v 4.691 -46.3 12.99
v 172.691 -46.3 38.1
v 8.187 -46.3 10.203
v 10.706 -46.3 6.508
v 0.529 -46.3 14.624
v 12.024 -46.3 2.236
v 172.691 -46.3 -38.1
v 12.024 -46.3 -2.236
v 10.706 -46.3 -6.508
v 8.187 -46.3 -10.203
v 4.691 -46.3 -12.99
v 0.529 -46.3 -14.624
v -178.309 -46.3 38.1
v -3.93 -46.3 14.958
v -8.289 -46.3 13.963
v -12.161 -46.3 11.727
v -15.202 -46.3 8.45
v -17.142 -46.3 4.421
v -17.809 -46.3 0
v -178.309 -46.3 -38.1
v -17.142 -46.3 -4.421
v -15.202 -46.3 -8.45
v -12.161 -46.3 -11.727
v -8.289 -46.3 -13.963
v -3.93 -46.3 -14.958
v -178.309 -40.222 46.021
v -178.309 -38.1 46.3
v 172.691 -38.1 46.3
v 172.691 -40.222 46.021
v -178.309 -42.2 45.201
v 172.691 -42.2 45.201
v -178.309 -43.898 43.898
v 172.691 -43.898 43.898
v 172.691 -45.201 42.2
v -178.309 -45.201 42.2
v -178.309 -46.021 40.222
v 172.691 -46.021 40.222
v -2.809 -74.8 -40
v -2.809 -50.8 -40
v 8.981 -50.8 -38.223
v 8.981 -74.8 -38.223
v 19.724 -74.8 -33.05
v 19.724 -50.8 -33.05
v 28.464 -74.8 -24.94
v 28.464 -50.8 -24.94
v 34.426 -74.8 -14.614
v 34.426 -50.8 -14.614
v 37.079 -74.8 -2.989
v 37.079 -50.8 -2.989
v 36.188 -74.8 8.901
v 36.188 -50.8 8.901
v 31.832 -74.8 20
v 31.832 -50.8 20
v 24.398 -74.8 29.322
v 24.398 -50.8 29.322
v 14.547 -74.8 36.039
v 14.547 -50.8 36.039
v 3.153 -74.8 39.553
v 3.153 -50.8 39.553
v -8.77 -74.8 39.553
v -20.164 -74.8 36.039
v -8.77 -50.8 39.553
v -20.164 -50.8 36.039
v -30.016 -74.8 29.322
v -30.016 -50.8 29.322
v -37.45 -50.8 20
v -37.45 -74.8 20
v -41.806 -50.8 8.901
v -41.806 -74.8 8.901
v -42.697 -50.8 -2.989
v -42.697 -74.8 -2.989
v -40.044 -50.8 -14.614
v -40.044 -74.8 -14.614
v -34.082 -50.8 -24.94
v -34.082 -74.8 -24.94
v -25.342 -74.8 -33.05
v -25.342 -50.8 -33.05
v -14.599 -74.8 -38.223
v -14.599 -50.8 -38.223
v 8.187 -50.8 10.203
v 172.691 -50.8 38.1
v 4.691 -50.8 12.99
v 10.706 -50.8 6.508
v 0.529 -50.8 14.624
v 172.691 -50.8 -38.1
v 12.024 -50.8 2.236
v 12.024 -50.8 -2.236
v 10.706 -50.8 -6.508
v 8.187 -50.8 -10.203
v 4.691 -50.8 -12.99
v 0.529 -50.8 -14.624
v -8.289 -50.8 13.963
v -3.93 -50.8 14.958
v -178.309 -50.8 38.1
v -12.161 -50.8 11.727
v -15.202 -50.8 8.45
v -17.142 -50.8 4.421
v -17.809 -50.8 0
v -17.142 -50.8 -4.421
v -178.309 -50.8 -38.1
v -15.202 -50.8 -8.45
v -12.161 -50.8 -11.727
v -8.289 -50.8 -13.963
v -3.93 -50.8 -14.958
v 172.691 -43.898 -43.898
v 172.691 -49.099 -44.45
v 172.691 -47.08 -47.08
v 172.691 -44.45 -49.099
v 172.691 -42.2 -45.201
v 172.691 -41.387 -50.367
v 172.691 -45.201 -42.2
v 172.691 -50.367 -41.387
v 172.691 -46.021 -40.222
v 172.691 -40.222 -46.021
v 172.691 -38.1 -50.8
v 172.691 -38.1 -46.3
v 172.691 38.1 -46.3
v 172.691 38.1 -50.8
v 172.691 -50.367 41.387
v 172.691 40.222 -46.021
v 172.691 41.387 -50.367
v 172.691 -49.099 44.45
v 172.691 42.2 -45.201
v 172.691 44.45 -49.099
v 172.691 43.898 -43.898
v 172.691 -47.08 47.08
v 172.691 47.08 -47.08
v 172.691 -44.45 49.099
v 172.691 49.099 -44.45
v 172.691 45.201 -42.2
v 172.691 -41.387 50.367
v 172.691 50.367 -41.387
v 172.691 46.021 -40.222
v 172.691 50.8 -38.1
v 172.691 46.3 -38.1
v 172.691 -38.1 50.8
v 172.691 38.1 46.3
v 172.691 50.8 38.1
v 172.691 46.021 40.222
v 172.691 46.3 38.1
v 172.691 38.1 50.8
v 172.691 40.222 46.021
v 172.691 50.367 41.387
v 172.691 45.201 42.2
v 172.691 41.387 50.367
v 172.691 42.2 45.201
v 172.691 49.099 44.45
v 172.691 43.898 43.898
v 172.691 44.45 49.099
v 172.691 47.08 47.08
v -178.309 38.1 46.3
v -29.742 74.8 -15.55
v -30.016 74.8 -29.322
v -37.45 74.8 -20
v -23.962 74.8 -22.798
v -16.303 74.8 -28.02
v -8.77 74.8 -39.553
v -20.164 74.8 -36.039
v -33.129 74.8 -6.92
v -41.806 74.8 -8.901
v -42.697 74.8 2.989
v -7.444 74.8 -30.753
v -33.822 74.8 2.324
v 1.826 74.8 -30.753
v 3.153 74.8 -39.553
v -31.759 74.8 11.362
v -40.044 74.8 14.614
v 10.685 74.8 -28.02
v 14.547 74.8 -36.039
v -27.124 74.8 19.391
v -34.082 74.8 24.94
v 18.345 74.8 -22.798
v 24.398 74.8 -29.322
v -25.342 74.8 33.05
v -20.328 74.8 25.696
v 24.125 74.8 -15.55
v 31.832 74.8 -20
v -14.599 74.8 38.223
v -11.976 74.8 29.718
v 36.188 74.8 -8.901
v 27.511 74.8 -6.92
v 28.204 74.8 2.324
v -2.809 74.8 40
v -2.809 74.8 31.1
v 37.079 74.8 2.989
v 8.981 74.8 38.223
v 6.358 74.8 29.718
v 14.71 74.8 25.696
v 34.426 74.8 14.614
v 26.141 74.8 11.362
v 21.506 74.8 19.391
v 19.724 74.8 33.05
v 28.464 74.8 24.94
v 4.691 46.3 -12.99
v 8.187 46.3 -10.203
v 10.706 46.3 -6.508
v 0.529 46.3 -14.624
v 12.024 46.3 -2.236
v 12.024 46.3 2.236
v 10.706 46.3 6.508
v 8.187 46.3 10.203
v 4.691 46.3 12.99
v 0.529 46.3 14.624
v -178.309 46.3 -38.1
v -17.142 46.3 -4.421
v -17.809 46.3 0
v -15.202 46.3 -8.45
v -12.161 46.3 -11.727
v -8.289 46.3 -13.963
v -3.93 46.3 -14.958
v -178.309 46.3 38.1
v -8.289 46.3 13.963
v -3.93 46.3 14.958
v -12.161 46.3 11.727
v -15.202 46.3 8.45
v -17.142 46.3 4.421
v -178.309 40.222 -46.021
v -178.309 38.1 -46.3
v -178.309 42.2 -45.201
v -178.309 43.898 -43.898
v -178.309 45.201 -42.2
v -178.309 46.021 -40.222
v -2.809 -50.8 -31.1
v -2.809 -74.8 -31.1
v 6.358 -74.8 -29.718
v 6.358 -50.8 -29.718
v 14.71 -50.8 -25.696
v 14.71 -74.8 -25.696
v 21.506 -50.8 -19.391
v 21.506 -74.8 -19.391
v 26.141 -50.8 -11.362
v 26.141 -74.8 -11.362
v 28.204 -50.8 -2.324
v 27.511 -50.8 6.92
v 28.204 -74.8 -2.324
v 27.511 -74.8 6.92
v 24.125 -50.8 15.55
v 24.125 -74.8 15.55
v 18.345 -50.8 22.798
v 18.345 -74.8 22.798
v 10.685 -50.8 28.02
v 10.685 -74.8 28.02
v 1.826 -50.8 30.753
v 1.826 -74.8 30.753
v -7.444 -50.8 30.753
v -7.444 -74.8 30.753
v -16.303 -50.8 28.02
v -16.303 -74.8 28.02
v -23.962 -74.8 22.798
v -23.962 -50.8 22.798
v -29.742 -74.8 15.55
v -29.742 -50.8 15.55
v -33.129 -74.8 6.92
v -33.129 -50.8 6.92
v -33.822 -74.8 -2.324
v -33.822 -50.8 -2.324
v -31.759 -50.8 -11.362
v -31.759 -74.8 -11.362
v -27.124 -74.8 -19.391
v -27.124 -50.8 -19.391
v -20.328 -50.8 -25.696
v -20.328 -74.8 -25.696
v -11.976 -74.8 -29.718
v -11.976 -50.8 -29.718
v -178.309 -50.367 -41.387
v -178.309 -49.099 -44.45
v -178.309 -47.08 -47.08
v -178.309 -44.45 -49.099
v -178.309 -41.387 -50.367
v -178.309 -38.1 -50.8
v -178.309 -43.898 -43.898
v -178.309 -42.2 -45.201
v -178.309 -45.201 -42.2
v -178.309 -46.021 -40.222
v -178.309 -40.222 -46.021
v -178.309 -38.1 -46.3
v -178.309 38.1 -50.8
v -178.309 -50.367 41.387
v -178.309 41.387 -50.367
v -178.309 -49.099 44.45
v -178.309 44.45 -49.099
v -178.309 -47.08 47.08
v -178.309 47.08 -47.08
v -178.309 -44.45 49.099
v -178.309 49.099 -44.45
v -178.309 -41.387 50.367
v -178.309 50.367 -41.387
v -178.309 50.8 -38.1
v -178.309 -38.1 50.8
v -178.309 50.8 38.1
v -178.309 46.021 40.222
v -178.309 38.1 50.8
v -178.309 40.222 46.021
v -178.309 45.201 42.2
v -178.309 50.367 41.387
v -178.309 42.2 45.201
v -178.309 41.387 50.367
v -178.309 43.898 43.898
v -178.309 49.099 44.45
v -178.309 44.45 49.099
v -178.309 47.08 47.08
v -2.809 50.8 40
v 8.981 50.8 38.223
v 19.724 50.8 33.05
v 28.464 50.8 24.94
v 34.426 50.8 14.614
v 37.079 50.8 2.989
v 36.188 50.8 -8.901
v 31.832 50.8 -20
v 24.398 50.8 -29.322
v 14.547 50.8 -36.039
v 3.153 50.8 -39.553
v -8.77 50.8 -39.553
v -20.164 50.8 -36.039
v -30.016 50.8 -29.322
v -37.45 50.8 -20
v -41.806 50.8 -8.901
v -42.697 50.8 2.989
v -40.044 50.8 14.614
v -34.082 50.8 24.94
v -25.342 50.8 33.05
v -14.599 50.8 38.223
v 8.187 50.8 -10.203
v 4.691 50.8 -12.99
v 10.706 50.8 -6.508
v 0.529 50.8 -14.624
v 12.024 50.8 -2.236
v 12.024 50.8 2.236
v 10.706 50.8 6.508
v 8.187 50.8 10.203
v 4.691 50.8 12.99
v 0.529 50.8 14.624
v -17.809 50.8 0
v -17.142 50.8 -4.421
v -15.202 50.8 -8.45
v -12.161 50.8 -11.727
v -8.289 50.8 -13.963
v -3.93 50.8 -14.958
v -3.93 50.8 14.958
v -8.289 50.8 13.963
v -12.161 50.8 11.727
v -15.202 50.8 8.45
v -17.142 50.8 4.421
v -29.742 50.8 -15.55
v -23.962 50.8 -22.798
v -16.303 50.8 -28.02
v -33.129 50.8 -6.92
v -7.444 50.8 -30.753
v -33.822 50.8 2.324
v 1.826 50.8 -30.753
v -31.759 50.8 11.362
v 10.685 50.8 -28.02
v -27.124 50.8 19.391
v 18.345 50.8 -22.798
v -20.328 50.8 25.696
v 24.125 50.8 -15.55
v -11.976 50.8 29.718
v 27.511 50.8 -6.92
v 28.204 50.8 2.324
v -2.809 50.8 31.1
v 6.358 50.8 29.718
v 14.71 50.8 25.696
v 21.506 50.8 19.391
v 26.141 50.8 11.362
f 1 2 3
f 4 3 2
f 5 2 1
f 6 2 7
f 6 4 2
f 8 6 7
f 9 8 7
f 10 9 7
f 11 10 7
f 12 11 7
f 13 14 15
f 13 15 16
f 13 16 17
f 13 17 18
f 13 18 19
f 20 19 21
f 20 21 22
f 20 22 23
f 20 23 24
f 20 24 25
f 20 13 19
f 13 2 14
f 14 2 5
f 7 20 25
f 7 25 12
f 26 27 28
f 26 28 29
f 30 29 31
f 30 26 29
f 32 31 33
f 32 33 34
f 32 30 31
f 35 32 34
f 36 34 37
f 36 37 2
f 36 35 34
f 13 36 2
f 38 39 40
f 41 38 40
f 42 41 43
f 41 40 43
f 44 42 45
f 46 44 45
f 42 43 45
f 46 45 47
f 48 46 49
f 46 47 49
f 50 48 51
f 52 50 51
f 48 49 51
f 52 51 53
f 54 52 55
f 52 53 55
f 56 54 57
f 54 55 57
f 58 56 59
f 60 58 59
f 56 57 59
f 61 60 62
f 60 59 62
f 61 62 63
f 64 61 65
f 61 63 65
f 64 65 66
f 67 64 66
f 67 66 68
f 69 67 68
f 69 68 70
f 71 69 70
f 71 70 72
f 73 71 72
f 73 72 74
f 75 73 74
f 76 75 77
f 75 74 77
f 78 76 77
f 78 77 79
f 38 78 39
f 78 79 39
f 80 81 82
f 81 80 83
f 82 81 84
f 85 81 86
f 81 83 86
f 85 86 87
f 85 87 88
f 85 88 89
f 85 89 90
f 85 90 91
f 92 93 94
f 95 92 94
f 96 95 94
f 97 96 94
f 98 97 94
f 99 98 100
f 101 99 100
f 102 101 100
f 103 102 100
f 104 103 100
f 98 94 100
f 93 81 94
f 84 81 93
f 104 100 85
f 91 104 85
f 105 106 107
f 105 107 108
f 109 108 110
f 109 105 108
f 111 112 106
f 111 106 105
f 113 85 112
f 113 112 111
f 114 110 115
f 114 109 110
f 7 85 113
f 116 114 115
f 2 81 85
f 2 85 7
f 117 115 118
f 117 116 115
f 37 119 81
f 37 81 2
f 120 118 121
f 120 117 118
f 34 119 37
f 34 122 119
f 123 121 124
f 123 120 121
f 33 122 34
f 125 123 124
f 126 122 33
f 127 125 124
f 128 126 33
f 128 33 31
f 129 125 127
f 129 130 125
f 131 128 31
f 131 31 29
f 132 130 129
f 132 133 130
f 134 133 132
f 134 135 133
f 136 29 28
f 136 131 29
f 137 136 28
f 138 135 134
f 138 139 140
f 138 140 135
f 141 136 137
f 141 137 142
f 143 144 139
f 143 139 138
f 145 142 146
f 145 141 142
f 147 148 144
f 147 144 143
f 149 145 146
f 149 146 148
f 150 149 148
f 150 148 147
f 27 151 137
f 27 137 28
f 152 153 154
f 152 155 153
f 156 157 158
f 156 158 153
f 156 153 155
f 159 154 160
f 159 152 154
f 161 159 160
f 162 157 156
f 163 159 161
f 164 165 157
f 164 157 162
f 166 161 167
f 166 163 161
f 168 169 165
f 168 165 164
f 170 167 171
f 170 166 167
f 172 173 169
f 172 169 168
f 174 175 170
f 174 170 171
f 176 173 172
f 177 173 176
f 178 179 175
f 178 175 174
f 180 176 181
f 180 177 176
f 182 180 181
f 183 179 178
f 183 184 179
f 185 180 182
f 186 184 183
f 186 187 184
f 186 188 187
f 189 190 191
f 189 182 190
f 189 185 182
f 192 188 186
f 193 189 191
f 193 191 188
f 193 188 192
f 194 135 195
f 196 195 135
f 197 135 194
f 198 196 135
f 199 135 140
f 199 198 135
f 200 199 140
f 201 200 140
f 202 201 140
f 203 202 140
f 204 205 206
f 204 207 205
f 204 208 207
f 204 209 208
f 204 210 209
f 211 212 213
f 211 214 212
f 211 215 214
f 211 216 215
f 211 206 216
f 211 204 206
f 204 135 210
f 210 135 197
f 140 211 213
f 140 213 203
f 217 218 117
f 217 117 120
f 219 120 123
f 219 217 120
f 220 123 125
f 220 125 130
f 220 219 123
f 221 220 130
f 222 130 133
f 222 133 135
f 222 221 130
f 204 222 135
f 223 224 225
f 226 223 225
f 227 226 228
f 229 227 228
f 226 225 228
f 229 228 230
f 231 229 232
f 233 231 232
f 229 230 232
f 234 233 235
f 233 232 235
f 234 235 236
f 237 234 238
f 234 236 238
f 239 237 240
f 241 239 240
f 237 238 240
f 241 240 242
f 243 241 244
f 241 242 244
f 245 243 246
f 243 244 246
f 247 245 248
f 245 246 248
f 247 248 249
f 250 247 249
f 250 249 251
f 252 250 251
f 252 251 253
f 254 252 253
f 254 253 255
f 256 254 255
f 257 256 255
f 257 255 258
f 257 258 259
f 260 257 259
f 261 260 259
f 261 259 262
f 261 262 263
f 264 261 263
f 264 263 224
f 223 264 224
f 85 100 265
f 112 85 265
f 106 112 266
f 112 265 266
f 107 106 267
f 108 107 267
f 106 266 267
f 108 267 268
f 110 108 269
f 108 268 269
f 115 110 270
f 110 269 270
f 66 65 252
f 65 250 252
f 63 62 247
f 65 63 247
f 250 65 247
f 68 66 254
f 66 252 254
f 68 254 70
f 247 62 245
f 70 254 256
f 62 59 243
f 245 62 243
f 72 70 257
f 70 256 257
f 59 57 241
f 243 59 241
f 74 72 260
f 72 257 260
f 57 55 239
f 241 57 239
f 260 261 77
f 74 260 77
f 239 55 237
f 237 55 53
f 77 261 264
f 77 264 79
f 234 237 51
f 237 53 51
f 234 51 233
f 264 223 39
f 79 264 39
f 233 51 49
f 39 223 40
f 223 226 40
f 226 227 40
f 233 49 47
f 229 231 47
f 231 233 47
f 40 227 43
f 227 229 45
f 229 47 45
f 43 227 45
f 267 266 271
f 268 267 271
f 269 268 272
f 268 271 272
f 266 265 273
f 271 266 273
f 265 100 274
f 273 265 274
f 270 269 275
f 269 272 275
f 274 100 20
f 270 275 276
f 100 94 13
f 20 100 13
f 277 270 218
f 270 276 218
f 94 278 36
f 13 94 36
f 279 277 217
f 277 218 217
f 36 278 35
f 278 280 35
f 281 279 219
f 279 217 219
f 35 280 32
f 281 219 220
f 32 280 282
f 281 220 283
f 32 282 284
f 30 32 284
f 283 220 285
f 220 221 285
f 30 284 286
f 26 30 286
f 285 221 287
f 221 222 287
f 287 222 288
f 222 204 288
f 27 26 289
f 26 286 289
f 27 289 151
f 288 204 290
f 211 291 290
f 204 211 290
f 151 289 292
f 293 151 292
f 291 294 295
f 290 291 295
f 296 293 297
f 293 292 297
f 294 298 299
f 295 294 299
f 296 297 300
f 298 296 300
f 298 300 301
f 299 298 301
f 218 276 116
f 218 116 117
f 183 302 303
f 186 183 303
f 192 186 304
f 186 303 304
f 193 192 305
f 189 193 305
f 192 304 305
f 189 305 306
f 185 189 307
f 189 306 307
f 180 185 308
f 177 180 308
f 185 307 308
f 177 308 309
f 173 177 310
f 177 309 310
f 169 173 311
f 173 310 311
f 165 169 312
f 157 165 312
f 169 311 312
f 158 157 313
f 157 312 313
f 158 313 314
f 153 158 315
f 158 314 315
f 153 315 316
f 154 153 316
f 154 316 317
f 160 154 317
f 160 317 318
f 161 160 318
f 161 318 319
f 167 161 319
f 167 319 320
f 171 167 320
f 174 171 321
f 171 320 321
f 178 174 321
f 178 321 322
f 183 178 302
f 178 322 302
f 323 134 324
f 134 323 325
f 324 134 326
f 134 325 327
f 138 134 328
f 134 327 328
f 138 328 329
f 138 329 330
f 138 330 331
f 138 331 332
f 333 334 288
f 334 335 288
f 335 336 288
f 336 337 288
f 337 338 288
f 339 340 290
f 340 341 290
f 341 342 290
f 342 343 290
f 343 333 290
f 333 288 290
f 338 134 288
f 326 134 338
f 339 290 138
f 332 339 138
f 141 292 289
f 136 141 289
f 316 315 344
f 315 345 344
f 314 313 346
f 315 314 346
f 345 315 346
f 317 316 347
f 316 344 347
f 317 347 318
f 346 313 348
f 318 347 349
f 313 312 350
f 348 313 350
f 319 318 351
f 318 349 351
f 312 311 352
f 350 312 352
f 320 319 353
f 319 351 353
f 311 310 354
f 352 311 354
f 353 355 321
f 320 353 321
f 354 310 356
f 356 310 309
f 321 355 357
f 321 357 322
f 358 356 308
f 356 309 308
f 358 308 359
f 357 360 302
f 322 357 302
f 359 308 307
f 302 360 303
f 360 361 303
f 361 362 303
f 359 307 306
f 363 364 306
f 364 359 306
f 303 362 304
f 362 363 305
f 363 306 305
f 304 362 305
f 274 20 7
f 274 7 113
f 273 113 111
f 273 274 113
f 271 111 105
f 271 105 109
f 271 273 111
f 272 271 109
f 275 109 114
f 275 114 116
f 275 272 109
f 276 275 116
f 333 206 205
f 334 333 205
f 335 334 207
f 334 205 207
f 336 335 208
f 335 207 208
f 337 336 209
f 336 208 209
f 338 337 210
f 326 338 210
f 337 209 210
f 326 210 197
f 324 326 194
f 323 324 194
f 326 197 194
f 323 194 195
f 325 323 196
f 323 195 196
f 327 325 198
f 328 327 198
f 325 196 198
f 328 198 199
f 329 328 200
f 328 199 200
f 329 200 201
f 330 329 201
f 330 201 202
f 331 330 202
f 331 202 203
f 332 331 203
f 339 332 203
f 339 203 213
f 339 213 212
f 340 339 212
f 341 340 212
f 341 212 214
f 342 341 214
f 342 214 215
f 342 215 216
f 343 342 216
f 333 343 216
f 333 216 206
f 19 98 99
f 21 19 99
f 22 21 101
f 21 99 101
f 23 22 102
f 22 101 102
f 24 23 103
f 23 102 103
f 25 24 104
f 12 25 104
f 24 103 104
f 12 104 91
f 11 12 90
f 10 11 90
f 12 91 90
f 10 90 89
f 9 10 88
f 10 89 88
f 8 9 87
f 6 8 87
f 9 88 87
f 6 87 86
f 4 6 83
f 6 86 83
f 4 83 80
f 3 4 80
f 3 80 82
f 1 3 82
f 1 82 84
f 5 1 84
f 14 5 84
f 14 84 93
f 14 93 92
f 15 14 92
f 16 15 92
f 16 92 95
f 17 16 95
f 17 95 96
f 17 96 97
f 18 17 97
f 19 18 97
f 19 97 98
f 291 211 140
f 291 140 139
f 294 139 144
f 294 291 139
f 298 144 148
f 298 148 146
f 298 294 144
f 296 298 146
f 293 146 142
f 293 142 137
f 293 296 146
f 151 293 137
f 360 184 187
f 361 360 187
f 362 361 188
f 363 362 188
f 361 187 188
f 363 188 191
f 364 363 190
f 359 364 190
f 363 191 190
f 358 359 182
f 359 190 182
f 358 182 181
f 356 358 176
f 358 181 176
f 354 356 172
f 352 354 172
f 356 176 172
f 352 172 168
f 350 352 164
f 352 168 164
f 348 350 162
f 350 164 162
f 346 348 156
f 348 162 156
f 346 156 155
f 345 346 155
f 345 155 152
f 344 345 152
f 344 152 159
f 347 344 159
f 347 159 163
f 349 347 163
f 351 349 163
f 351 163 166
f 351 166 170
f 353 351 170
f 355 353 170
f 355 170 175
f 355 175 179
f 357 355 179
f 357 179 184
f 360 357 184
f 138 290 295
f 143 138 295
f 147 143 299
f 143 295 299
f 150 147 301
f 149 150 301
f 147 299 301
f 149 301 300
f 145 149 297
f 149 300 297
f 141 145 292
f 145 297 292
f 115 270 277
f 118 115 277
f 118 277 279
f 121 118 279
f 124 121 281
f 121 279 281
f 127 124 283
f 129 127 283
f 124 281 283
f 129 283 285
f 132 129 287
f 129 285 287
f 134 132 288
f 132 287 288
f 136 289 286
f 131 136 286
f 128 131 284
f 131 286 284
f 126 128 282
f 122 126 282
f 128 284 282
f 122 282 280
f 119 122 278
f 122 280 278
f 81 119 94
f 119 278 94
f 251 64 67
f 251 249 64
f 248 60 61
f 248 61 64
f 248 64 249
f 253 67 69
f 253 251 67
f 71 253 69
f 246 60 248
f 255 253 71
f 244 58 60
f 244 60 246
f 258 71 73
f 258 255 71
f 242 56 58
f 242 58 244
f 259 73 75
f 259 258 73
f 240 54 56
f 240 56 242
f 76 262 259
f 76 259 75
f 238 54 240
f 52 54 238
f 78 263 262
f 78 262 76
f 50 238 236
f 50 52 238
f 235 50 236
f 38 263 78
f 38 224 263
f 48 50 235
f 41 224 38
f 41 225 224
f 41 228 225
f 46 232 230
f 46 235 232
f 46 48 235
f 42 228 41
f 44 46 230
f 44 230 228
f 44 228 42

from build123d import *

# Parameters (mm, degrees)
MIEMBRO_ESTRUCTURAL1_DEPTH    = 351
TALADRO_DE_MARGEN_PARA_M391_D = 30
CROQUIS6_R                    = 40
SALIENTE_EXTRUIR1_DEPTH       = 24
CROQUIS7_R                    = 31.1
CORTAR_EXTRUIR1_DEPTH         = 30
CROQUIS8_R                    = 40
SALIENTE_EXTRUIR2_DEPTH       = 24
CROQUIS9_R                    = 31.1
CORTAR_EXTRUIR2_DEPTH         = 30


with BuildPart() as part:
    # Sketch1 → Miembro estructural1 (new body)
    with BuildSketch(Plane.YZ.offset(-178.308765334)):
        with BuildLine():
            Line((-38.1, -50.8), (38.1, -50.8))
            ThreePointArc((38.1, -50.8), (47.080256121, -47.080256121), (50.8, -38.1))
            Line((50.8, -38.1), (50.8, 38.1))
            ThreePointArc((50.8, 38.1), (47.080256121, 47.080256121), (38.1, 50.8))
            Line((38.1, 50.8), (-38.1, 50.8))
            ThreePointArc((-38.1, 50.8), (-47.080256121, 47.080256121), (-50.8, 38.1))
            Line((-50.8, 38.1), (-50.8, -38.1))
            ThreePointArc((-50.8, -38.1), (-47.080256121, -47.080256121), (-38.1, -50.8))
        make_face()
        with BuildLine():
            Line((-38.1, -46.3), (38.1, -46.3))
            ThreePointArc((38.1, -46.3), (43.898275606, -43.898275606), (46.3, -38.1))
            Line((46.3, -38.1), (46.3, 38.1))
            ThreePointArc((46.3, 38.1), (43.898275606, 43.898275606), (38.1, 46.3))
            Line((38.1, 46.3), (-38.1, 46.3))
            ThreePointArc((-38.1, 46.3), (-43.898275606, 43.898275606), (-46.3, 38.1))
            Line((-46.3, 38.1), (-46.3, -38.1))
            ThreePointArc((-46.3, -38.1), (-43.898275606, -43.898275606), (-38.1, -46.3))
        make_face(mode=Mode.SUBTRACT)
    extrude(amount=MIEMBRO_ESTRUCTURAL1_DEPTH)

    # Taladro de margen para M391 (through all)
    with Locations(Plane(origin=(0, 50.8, 0), x_dir=(1, 0, 0), z_dir=(0, 1, 0))):
        with Locations((-2.808765334, 0)):
            Hole(TALADRO_DE_MARGEN_PARA_M391_D / 2)


with BuildPart() as body_2:
    # Croquis6 → Saliente-Extruir1 (new body)
    with BuildSketch(Plane(origin=(0, 50.8, 0), x_dir=(1, 0, 0), z_dir=(0, 1, 0))):
        with Locations(Location((-2.808765334, 0, 0), (0, 0, 270))):
            Circle(CROQUIS6_R)
    extrude(amount=SALIENTE_EXTRUIR1_DEPTH)

    # Croquis7 → Cortar-Extruir1 (cut)
    with BuildSketch(Plane(origin=(0, 74.8, 0), x_dir=(1, 0, 0), z_dir=(0, 1, 0))):
        with Locations(Location((-2.808765334, 0, 0), (0, 0, 270))):
            Circle(CROQUIS7_R)
    extrude(amount=-CORTAR_EXTRUIR1_DEPTH, mode=Mode.SUBTRACT)


with BuildPart() as body_3:
    # Croquis8 → Saliente-Extruir2 (new body)
    with BuildSketch(Plane(origin=(0, -50.8, 0), x_dir=(-1, 0, 0), z_dir=(0, -1, 0))):
        with Locations(Location((2.808765334, 0, 0), (0, 0, 90))):
            Circle(CROQUIS8_R)
    extrude(amount=SALIENTE_EXTRUIR2_DEPTH)

    # Croquis9 → Cortar-Extruir2 (cut)
    with BuildSketch(Plane(origin=(0, -74.8, 0), x_dir=(-1, 0, 0), z_dir=(0, -1, 0))):
        with Locations(Location((2.808765334, 0, 0), (0, 0, 90))):
            Circle(CROQUIS9_R)
    extrude(amount=-CORTAR_EXTRUIR2_DEPTH, mode=Mode.SUBTRACT)


solid = Compound([part.part, body_2.part, body_3.part])
